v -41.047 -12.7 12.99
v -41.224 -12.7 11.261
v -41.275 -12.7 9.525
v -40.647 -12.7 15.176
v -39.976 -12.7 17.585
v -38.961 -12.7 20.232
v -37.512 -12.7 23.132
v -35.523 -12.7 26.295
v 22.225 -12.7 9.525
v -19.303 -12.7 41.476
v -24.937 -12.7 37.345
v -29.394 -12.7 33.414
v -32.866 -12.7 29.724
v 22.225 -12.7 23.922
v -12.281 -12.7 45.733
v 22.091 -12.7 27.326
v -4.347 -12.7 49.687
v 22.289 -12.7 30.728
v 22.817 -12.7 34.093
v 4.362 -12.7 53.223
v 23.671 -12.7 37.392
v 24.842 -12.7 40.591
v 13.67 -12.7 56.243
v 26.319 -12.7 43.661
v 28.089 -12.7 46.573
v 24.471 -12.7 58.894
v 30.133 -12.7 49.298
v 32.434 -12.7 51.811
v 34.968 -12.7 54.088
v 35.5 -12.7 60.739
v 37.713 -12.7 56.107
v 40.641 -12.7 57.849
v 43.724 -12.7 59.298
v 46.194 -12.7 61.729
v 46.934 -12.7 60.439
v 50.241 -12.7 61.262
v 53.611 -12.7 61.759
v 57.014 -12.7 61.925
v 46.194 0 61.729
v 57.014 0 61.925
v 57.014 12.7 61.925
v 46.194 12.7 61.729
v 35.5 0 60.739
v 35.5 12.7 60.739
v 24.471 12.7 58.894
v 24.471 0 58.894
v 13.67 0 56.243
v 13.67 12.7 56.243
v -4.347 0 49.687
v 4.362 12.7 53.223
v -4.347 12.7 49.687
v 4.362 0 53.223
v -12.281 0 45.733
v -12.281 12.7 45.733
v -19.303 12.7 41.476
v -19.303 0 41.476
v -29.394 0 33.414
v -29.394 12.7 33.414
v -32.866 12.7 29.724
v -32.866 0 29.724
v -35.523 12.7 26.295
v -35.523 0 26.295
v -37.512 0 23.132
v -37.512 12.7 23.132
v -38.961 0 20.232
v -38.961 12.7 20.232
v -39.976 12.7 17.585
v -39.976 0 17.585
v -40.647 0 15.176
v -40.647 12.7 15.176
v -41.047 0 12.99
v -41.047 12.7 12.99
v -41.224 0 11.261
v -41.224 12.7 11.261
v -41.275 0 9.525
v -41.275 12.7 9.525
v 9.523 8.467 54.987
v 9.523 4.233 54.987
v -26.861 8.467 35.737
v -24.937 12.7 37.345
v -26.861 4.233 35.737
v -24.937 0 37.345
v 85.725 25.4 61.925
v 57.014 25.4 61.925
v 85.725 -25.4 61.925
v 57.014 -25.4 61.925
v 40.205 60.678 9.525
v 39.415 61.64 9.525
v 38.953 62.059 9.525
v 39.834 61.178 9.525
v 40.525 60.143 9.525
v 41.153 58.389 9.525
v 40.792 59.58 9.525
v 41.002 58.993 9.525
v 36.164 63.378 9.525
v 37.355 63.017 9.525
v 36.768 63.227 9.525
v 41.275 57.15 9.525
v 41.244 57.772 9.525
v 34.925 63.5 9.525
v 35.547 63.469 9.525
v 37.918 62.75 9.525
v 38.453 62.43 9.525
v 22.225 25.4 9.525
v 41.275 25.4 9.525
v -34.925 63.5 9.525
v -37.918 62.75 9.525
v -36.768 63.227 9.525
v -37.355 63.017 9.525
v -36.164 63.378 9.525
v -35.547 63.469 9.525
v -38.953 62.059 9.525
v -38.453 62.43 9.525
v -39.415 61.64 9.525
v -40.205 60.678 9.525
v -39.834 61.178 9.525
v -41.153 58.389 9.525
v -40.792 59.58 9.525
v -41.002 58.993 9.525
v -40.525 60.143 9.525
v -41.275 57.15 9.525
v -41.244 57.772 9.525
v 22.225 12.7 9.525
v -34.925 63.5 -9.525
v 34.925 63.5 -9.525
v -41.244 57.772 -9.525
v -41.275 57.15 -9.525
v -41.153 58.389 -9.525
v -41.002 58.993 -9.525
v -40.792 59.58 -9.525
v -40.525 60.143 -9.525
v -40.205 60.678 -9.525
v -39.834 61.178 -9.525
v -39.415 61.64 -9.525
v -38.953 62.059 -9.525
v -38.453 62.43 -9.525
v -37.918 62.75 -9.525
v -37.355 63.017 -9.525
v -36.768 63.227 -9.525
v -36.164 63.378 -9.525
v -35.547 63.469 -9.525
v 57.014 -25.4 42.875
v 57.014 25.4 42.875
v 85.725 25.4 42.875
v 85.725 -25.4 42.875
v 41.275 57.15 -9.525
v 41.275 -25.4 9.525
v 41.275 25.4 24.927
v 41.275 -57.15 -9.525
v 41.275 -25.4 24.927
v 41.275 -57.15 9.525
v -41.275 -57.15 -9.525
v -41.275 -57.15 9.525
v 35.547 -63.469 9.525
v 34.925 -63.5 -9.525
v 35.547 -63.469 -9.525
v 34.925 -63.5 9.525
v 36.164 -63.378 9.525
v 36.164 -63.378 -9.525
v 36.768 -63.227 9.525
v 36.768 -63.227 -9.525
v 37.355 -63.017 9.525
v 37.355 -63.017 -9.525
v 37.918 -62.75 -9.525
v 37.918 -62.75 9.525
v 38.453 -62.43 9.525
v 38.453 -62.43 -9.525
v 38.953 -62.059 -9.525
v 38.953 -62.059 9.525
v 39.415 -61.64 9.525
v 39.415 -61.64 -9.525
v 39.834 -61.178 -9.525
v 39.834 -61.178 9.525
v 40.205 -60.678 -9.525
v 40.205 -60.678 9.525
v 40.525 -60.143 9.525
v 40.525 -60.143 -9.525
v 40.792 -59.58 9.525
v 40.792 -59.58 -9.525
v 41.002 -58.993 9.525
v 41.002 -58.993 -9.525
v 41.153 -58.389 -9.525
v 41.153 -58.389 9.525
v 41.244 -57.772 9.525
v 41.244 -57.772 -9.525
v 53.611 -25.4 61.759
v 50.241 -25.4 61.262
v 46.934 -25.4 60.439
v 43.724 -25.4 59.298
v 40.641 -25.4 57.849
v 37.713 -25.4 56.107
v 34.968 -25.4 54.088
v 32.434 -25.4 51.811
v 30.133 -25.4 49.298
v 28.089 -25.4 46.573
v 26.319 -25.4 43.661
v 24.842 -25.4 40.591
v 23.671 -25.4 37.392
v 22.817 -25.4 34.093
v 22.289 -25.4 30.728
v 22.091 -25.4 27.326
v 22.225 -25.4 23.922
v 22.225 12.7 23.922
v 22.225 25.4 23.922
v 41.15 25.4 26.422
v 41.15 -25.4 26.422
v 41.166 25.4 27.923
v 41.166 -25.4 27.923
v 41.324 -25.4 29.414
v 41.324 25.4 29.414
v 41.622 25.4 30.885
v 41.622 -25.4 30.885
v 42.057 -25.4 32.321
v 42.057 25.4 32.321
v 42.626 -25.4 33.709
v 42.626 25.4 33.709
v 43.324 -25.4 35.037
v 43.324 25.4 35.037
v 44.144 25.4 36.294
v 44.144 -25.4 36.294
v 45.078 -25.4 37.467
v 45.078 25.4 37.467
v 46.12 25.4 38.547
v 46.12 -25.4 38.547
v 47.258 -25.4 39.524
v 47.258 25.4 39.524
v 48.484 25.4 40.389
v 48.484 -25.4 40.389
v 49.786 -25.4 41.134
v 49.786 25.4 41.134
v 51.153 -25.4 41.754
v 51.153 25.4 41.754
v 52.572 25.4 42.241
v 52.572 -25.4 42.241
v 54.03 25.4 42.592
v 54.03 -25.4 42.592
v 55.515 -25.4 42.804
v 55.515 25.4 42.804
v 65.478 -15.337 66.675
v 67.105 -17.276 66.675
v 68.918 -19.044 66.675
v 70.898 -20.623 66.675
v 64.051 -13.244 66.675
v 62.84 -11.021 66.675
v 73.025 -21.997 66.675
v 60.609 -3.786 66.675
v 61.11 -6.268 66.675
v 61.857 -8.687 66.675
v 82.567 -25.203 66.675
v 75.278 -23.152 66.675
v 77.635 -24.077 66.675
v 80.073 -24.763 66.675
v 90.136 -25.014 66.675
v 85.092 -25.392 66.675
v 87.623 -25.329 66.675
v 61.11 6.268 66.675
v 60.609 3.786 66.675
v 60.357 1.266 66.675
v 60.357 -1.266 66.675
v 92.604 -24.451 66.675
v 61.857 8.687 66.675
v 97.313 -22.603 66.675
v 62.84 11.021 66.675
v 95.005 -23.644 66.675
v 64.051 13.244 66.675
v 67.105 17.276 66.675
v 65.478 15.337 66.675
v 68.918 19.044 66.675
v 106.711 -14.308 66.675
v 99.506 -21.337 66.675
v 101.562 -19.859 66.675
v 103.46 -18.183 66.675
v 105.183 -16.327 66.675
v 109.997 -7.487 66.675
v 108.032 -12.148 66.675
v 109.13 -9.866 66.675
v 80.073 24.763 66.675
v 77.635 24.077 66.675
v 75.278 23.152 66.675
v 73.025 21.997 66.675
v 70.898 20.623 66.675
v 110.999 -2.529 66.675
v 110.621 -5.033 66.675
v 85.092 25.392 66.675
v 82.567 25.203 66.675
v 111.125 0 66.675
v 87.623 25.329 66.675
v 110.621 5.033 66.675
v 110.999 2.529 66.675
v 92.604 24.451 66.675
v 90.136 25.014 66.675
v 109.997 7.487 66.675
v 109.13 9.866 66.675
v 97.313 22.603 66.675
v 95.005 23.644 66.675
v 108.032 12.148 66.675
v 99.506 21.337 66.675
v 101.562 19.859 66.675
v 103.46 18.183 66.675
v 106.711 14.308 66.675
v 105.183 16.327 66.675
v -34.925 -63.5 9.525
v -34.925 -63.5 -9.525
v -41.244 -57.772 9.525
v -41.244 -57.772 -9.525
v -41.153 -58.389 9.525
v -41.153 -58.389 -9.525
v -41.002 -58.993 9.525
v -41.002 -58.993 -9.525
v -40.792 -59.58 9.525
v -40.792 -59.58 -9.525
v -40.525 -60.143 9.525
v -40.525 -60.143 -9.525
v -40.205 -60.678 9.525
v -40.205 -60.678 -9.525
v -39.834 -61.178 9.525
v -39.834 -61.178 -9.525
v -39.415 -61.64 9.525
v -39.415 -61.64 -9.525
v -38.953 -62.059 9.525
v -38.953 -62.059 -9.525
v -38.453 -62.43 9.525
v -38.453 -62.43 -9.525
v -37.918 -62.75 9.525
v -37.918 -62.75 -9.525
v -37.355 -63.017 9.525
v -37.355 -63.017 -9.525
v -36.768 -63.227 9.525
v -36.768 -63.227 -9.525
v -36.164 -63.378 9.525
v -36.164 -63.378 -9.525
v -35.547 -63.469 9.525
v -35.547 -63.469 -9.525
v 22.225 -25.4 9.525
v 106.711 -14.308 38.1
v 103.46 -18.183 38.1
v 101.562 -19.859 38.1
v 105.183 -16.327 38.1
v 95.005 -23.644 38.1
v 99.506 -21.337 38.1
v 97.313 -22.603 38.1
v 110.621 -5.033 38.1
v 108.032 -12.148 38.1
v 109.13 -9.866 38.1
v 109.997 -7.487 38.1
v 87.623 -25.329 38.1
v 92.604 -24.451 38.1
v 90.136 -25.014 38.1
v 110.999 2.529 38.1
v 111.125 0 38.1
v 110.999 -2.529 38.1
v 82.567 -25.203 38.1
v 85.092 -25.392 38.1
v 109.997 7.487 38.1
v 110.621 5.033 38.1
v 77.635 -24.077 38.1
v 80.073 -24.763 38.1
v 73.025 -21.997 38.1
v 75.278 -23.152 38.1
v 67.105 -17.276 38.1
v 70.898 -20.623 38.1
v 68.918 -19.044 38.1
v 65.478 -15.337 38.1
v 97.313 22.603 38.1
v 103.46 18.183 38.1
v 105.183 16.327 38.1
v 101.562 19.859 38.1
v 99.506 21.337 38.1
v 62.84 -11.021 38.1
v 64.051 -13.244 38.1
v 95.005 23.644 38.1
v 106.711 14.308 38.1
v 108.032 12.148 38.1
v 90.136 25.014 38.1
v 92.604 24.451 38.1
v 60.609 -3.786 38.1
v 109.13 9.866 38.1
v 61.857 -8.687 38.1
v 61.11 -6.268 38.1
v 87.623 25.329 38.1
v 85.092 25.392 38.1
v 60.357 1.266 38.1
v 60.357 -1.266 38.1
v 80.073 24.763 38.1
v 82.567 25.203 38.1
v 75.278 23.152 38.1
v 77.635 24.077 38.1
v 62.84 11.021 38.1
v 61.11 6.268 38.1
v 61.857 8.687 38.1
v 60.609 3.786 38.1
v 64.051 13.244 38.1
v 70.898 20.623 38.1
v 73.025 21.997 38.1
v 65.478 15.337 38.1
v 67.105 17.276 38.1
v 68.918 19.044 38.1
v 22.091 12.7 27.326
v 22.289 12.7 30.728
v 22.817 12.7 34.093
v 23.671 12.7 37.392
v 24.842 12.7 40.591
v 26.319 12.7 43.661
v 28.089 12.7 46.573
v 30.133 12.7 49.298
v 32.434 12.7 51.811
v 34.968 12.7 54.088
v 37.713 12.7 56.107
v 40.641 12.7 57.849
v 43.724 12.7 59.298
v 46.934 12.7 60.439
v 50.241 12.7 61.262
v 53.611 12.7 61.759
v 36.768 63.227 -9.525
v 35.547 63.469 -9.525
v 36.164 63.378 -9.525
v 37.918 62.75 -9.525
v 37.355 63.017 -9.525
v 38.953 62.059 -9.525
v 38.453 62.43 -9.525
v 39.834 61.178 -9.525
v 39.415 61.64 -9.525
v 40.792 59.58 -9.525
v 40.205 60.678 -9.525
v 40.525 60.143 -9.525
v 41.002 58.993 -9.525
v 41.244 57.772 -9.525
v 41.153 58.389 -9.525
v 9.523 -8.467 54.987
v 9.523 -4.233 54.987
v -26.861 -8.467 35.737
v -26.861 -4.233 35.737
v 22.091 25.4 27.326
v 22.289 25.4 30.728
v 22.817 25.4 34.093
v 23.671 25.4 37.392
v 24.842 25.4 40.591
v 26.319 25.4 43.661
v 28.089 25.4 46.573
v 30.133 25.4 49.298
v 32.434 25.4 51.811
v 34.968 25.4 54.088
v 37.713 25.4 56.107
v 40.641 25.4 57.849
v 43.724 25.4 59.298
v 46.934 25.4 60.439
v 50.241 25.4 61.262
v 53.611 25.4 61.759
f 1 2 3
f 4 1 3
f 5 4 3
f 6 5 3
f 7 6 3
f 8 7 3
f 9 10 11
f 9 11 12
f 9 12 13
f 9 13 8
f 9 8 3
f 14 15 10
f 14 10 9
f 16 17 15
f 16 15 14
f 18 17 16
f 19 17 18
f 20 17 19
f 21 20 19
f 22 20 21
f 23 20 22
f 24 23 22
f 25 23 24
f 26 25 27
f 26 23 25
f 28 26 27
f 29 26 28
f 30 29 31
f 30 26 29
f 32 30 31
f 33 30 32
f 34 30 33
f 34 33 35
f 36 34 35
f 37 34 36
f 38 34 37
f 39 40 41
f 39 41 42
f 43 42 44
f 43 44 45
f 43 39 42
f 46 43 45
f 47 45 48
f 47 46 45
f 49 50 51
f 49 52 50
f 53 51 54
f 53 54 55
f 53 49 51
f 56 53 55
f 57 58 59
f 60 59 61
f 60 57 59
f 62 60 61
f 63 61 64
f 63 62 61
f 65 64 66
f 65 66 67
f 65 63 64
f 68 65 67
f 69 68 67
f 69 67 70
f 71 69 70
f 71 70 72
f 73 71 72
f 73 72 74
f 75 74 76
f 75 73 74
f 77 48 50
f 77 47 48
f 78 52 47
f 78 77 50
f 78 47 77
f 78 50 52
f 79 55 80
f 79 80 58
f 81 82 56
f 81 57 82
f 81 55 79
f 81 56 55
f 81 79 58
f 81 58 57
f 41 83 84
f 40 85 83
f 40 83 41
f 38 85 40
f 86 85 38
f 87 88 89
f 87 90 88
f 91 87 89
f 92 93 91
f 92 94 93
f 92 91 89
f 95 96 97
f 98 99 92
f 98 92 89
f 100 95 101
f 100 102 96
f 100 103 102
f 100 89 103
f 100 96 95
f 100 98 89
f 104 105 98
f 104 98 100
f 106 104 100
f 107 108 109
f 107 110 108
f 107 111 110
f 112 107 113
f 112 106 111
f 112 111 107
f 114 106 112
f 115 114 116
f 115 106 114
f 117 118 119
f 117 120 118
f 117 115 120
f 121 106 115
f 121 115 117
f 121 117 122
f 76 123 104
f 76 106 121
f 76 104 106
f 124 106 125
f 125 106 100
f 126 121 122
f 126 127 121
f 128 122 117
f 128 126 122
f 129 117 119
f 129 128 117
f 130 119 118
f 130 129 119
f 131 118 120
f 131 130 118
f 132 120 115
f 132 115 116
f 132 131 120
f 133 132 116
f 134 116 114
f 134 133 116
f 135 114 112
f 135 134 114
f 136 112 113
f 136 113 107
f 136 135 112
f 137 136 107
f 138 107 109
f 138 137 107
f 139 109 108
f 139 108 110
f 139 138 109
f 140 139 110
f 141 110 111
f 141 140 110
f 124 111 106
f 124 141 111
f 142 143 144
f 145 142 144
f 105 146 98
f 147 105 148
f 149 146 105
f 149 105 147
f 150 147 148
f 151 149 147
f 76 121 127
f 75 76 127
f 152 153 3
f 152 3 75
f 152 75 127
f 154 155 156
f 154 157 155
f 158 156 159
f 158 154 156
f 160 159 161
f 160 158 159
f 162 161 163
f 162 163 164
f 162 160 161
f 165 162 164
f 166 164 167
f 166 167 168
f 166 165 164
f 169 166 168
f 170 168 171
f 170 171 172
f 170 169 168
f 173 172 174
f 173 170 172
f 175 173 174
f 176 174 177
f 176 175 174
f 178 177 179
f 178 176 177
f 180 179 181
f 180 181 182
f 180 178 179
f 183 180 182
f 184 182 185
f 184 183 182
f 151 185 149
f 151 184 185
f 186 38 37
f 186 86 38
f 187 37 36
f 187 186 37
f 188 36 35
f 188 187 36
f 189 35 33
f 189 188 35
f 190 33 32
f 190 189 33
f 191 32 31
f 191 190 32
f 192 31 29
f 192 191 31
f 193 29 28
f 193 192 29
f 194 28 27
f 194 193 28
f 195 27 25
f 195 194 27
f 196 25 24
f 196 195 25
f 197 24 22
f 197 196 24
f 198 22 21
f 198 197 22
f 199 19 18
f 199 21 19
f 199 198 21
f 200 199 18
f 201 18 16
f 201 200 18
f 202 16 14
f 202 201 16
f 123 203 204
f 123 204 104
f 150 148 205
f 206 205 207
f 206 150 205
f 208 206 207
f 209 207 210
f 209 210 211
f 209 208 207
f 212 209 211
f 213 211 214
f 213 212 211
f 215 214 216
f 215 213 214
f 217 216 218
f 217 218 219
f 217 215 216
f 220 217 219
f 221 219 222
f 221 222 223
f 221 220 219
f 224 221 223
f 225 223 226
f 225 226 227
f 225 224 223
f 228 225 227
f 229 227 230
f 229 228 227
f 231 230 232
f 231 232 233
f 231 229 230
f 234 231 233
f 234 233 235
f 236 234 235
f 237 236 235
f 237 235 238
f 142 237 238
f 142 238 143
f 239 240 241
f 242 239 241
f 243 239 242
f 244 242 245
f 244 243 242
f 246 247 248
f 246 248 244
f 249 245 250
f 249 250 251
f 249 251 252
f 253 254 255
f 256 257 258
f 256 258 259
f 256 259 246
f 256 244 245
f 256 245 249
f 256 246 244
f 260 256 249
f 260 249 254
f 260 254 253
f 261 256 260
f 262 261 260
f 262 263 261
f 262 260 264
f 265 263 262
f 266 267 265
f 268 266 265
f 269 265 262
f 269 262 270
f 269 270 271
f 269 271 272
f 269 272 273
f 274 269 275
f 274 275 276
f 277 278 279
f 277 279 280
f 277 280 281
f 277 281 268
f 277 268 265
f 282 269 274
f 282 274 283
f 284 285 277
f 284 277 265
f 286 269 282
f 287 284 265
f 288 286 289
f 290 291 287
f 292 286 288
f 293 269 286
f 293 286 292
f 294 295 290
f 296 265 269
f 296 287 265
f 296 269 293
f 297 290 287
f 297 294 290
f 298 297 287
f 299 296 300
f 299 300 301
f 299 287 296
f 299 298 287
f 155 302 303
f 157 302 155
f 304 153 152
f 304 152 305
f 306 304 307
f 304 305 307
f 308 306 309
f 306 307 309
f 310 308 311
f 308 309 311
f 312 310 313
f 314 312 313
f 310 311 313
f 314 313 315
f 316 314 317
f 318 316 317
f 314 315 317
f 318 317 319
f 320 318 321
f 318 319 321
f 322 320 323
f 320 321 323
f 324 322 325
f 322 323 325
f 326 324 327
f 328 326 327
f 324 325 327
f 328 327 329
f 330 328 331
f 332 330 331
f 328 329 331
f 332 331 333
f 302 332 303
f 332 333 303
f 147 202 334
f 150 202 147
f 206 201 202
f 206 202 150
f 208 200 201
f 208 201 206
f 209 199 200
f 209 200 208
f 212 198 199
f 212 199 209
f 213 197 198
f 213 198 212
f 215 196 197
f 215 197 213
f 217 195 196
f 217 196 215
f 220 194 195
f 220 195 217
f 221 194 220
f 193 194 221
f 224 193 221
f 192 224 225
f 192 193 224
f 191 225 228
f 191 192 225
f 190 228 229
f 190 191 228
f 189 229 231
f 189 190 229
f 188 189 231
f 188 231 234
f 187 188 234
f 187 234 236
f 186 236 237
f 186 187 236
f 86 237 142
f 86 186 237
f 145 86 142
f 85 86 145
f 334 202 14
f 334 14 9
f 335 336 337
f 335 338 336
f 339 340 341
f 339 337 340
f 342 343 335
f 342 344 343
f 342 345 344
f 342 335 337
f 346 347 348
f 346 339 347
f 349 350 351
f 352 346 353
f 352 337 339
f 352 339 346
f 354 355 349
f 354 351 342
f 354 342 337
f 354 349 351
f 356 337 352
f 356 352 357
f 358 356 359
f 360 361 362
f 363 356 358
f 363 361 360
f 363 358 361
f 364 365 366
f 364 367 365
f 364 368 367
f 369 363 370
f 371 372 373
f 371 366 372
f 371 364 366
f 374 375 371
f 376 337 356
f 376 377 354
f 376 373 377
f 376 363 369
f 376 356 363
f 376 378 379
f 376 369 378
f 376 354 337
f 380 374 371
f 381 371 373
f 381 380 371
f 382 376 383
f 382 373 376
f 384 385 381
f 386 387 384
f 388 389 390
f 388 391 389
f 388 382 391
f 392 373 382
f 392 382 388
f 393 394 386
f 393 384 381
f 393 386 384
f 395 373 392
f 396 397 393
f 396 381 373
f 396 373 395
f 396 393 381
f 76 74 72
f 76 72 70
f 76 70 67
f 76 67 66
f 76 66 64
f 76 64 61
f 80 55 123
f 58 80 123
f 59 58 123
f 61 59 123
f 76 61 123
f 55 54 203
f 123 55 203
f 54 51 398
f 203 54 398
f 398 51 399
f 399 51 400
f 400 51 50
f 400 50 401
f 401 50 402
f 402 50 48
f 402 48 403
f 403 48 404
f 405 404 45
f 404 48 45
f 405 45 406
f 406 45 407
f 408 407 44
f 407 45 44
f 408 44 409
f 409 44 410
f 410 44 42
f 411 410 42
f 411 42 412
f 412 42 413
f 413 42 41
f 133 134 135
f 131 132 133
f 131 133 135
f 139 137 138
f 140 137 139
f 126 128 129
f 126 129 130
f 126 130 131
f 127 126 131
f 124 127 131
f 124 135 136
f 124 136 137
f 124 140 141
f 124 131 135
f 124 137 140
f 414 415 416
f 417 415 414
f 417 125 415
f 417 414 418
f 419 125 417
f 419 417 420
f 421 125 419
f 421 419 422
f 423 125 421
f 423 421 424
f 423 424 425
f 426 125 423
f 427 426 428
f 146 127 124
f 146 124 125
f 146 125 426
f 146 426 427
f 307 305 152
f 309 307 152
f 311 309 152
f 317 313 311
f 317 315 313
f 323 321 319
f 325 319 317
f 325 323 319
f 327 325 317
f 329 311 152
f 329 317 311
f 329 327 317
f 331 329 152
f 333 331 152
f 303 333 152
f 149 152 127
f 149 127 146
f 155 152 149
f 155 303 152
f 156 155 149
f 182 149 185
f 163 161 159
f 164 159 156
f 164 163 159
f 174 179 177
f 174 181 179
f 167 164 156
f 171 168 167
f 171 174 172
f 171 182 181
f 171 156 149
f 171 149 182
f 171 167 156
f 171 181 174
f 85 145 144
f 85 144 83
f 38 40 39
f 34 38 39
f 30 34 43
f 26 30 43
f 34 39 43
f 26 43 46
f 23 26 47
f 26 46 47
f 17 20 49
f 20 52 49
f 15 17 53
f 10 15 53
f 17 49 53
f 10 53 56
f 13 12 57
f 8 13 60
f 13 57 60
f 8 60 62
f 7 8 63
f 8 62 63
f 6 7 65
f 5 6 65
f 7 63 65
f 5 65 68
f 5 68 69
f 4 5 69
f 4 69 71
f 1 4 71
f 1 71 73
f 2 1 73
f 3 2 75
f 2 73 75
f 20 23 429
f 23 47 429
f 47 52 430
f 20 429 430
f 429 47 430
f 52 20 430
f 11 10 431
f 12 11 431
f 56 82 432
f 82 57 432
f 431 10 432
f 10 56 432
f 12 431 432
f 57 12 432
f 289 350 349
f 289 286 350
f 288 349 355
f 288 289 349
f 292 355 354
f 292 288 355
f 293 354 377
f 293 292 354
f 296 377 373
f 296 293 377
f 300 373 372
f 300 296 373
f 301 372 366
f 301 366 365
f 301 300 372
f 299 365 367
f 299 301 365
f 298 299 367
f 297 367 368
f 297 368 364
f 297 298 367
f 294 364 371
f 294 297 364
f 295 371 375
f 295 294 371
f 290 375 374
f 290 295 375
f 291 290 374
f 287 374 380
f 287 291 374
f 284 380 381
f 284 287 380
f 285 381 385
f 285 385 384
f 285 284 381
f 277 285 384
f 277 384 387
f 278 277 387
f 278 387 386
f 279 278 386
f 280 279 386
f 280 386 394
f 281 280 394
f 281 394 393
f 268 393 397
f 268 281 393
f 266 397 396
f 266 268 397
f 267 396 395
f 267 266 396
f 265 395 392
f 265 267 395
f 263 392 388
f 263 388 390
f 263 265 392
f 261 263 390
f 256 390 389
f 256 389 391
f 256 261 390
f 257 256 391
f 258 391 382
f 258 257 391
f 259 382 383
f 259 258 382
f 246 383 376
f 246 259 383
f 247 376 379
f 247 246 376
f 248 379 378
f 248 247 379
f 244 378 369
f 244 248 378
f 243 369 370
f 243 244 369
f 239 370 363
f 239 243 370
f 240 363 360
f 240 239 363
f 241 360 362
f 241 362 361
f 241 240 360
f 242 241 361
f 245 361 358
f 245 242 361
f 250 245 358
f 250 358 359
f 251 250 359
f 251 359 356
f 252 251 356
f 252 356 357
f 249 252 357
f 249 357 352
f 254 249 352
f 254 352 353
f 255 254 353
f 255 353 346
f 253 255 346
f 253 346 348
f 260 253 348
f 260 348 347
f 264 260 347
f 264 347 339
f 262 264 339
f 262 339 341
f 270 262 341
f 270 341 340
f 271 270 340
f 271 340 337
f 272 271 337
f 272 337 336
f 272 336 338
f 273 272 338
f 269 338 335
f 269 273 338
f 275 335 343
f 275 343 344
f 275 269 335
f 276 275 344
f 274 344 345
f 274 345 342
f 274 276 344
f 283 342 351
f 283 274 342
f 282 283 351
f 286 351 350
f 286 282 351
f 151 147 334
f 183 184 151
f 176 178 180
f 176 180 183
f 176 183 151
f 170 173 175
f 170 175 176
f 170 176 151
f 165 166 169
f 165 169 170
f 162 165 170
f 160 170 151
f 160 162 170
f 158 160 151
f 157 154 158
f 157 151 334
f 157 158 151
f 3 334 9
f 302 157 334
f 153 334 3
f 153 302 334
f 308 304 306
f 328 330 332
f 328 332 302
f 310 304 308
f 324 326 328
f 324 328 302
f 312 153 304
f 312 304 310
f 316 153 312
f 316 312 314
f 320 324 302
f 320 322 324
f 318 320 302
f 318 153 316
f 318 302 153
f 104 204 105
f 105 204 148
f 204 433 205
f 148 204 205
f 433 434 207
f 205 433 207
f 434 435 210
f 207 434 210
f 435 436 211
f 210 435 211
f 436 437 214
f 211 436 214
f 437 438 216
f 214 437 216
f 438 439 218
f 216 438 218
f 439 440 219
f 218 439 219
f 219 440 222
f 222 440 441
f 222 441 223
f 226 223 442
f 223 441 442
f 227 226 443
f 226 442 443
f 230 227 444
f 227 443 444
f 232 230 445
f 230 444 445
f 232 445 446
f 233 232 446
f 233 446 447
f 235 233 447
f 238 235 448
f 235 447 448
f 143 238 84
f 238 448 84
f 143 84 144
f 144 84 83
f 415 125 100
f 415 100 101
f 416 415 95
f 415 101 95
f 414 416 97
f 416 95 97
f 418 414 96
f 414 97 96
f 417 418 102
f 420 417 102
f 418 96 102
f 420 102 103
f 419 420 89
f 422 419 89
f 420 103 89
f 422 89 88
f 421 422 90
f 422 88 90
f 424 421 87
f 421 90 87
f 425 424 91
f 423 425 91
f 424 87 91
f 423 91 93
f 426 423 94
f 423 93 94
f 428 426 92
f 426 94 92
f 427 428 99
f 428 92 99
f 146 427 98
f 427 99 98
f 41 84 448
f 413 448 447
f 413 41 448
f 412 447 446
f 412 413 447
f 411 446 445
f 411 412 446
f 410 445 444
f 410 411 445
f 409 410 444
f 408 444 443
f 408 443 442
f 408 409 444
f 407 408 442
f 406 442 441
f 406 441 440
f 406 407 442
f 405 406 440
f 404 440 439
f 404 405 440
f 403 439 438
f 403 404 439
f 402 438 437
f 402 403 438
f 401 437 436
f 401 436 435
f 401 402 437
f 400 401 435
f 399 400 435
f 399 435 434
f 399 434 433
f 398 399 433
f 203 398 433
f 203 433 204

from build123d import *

# Parameters (mm, degrees)
F1_DEPTH = 63.5
F0_W     = 25.4
F0_H     = 19.05
F2_DEPTH = 25.4
F3_DEPTH = 12.7
F5_R     = 6.35


# Not quite as in the source:
# - a feature names something its author has since deleted; it is built from what else it names


with BuildPart() as f1:
    # F0 (on Front) → F1 (new body, symmetric)
    with BuildSketch(Plane.XZ):
        Polygon((-41.275, 9.525), (-41.275, -9.525), (41.275, -9.525), (41.275, 9.525), (22.225, 9.525), align=None)
    extrude(amount=F1_DEPTH, both=True)

    # F0 (on Front) → F2 (join, symmetric)
    with BuildSketch(Plane.XZ):
        with BuildLine():
            Line((22.225, 9.525), (41.275, 9.525))
            Line((41.275, 9.525), (41.275, 24.9272808433))
            ThreePointArc((41.275, 24.9272808433), (45.0783515165, 37.4670054674), (57.0140797434, 42.8752))
            Line((57.0140797434, 42.8752), (60.325, 42.8752))
            Line((60.325, 42.8752), (60.325, 61.9252))
            Line((60.325, 61.9252), (57.0140797434, 61.9252))
            ThreePointArc((57.0140797434, 61.9252), (31.2530323697, 50.5824828244), (22.225, 23.9219609569))
            Line((22.225, 23.9219609569), (22.225, 9.525))
        make_face()
        with Locations((73.025, 52.4002)):
            Rectangle(F0_W, F0_H)
    extrude(amount=F2_DEPTH, both=True)

    # F0 (on Front) → F3 (join, symmetric)
    with BuildSketch(Plane.XZ):
        with BuildLine():
            add(Edge.make_bspline(
                [(57.0140797434, 61.9252), (7.5895511545, 62.9258826375), (-41.465934366, 37.4339222908), (-41.275, 9.525)],
                knots=[0, 0, 0, 0, 111.3845777334, 111.3845777334, 111.3845777334, 111.3845777334], degree=3))
            Line((-41.275, 9.525), (22.225, 9.525))
            Line((22.225, 9.525), (22.225, 23.9219609569))
            ThreePointArc((22.225, 23.9219609569), (31.2530323697, 50.5824828244), (57.0140797434, 61.9252))
        make_face()
    extrude(amount=F3_DEPTH, both=True)

    # F5
    f5_edges = [f1.edges().sort_by_distance(p)[0] for p in [
        (41.275, -63.5, 0),
        (-41.275, -63.5, 0),
        (-41.275, 63.5, 0),
        (41.275, 63.5, 0),
    ]]
    fillet(f5_edges, radius=F5_R)


with BuildPart() as f4:
    # F0 (on Front) → F4 (revolve)
    with BuildSketch(Plane.XZ):
        Polygon((85.725, 66.675), (85.725, 61.9252), (85.725, 42.8752), (85.725, 38.1), (111.125, 38.1), (111.125, 66.675), align=None)
    revolve(axis=Axis((85.725, 0, 52.3875), (0, 0, 1)))


solid = Compound([f1.part, f4.part])
